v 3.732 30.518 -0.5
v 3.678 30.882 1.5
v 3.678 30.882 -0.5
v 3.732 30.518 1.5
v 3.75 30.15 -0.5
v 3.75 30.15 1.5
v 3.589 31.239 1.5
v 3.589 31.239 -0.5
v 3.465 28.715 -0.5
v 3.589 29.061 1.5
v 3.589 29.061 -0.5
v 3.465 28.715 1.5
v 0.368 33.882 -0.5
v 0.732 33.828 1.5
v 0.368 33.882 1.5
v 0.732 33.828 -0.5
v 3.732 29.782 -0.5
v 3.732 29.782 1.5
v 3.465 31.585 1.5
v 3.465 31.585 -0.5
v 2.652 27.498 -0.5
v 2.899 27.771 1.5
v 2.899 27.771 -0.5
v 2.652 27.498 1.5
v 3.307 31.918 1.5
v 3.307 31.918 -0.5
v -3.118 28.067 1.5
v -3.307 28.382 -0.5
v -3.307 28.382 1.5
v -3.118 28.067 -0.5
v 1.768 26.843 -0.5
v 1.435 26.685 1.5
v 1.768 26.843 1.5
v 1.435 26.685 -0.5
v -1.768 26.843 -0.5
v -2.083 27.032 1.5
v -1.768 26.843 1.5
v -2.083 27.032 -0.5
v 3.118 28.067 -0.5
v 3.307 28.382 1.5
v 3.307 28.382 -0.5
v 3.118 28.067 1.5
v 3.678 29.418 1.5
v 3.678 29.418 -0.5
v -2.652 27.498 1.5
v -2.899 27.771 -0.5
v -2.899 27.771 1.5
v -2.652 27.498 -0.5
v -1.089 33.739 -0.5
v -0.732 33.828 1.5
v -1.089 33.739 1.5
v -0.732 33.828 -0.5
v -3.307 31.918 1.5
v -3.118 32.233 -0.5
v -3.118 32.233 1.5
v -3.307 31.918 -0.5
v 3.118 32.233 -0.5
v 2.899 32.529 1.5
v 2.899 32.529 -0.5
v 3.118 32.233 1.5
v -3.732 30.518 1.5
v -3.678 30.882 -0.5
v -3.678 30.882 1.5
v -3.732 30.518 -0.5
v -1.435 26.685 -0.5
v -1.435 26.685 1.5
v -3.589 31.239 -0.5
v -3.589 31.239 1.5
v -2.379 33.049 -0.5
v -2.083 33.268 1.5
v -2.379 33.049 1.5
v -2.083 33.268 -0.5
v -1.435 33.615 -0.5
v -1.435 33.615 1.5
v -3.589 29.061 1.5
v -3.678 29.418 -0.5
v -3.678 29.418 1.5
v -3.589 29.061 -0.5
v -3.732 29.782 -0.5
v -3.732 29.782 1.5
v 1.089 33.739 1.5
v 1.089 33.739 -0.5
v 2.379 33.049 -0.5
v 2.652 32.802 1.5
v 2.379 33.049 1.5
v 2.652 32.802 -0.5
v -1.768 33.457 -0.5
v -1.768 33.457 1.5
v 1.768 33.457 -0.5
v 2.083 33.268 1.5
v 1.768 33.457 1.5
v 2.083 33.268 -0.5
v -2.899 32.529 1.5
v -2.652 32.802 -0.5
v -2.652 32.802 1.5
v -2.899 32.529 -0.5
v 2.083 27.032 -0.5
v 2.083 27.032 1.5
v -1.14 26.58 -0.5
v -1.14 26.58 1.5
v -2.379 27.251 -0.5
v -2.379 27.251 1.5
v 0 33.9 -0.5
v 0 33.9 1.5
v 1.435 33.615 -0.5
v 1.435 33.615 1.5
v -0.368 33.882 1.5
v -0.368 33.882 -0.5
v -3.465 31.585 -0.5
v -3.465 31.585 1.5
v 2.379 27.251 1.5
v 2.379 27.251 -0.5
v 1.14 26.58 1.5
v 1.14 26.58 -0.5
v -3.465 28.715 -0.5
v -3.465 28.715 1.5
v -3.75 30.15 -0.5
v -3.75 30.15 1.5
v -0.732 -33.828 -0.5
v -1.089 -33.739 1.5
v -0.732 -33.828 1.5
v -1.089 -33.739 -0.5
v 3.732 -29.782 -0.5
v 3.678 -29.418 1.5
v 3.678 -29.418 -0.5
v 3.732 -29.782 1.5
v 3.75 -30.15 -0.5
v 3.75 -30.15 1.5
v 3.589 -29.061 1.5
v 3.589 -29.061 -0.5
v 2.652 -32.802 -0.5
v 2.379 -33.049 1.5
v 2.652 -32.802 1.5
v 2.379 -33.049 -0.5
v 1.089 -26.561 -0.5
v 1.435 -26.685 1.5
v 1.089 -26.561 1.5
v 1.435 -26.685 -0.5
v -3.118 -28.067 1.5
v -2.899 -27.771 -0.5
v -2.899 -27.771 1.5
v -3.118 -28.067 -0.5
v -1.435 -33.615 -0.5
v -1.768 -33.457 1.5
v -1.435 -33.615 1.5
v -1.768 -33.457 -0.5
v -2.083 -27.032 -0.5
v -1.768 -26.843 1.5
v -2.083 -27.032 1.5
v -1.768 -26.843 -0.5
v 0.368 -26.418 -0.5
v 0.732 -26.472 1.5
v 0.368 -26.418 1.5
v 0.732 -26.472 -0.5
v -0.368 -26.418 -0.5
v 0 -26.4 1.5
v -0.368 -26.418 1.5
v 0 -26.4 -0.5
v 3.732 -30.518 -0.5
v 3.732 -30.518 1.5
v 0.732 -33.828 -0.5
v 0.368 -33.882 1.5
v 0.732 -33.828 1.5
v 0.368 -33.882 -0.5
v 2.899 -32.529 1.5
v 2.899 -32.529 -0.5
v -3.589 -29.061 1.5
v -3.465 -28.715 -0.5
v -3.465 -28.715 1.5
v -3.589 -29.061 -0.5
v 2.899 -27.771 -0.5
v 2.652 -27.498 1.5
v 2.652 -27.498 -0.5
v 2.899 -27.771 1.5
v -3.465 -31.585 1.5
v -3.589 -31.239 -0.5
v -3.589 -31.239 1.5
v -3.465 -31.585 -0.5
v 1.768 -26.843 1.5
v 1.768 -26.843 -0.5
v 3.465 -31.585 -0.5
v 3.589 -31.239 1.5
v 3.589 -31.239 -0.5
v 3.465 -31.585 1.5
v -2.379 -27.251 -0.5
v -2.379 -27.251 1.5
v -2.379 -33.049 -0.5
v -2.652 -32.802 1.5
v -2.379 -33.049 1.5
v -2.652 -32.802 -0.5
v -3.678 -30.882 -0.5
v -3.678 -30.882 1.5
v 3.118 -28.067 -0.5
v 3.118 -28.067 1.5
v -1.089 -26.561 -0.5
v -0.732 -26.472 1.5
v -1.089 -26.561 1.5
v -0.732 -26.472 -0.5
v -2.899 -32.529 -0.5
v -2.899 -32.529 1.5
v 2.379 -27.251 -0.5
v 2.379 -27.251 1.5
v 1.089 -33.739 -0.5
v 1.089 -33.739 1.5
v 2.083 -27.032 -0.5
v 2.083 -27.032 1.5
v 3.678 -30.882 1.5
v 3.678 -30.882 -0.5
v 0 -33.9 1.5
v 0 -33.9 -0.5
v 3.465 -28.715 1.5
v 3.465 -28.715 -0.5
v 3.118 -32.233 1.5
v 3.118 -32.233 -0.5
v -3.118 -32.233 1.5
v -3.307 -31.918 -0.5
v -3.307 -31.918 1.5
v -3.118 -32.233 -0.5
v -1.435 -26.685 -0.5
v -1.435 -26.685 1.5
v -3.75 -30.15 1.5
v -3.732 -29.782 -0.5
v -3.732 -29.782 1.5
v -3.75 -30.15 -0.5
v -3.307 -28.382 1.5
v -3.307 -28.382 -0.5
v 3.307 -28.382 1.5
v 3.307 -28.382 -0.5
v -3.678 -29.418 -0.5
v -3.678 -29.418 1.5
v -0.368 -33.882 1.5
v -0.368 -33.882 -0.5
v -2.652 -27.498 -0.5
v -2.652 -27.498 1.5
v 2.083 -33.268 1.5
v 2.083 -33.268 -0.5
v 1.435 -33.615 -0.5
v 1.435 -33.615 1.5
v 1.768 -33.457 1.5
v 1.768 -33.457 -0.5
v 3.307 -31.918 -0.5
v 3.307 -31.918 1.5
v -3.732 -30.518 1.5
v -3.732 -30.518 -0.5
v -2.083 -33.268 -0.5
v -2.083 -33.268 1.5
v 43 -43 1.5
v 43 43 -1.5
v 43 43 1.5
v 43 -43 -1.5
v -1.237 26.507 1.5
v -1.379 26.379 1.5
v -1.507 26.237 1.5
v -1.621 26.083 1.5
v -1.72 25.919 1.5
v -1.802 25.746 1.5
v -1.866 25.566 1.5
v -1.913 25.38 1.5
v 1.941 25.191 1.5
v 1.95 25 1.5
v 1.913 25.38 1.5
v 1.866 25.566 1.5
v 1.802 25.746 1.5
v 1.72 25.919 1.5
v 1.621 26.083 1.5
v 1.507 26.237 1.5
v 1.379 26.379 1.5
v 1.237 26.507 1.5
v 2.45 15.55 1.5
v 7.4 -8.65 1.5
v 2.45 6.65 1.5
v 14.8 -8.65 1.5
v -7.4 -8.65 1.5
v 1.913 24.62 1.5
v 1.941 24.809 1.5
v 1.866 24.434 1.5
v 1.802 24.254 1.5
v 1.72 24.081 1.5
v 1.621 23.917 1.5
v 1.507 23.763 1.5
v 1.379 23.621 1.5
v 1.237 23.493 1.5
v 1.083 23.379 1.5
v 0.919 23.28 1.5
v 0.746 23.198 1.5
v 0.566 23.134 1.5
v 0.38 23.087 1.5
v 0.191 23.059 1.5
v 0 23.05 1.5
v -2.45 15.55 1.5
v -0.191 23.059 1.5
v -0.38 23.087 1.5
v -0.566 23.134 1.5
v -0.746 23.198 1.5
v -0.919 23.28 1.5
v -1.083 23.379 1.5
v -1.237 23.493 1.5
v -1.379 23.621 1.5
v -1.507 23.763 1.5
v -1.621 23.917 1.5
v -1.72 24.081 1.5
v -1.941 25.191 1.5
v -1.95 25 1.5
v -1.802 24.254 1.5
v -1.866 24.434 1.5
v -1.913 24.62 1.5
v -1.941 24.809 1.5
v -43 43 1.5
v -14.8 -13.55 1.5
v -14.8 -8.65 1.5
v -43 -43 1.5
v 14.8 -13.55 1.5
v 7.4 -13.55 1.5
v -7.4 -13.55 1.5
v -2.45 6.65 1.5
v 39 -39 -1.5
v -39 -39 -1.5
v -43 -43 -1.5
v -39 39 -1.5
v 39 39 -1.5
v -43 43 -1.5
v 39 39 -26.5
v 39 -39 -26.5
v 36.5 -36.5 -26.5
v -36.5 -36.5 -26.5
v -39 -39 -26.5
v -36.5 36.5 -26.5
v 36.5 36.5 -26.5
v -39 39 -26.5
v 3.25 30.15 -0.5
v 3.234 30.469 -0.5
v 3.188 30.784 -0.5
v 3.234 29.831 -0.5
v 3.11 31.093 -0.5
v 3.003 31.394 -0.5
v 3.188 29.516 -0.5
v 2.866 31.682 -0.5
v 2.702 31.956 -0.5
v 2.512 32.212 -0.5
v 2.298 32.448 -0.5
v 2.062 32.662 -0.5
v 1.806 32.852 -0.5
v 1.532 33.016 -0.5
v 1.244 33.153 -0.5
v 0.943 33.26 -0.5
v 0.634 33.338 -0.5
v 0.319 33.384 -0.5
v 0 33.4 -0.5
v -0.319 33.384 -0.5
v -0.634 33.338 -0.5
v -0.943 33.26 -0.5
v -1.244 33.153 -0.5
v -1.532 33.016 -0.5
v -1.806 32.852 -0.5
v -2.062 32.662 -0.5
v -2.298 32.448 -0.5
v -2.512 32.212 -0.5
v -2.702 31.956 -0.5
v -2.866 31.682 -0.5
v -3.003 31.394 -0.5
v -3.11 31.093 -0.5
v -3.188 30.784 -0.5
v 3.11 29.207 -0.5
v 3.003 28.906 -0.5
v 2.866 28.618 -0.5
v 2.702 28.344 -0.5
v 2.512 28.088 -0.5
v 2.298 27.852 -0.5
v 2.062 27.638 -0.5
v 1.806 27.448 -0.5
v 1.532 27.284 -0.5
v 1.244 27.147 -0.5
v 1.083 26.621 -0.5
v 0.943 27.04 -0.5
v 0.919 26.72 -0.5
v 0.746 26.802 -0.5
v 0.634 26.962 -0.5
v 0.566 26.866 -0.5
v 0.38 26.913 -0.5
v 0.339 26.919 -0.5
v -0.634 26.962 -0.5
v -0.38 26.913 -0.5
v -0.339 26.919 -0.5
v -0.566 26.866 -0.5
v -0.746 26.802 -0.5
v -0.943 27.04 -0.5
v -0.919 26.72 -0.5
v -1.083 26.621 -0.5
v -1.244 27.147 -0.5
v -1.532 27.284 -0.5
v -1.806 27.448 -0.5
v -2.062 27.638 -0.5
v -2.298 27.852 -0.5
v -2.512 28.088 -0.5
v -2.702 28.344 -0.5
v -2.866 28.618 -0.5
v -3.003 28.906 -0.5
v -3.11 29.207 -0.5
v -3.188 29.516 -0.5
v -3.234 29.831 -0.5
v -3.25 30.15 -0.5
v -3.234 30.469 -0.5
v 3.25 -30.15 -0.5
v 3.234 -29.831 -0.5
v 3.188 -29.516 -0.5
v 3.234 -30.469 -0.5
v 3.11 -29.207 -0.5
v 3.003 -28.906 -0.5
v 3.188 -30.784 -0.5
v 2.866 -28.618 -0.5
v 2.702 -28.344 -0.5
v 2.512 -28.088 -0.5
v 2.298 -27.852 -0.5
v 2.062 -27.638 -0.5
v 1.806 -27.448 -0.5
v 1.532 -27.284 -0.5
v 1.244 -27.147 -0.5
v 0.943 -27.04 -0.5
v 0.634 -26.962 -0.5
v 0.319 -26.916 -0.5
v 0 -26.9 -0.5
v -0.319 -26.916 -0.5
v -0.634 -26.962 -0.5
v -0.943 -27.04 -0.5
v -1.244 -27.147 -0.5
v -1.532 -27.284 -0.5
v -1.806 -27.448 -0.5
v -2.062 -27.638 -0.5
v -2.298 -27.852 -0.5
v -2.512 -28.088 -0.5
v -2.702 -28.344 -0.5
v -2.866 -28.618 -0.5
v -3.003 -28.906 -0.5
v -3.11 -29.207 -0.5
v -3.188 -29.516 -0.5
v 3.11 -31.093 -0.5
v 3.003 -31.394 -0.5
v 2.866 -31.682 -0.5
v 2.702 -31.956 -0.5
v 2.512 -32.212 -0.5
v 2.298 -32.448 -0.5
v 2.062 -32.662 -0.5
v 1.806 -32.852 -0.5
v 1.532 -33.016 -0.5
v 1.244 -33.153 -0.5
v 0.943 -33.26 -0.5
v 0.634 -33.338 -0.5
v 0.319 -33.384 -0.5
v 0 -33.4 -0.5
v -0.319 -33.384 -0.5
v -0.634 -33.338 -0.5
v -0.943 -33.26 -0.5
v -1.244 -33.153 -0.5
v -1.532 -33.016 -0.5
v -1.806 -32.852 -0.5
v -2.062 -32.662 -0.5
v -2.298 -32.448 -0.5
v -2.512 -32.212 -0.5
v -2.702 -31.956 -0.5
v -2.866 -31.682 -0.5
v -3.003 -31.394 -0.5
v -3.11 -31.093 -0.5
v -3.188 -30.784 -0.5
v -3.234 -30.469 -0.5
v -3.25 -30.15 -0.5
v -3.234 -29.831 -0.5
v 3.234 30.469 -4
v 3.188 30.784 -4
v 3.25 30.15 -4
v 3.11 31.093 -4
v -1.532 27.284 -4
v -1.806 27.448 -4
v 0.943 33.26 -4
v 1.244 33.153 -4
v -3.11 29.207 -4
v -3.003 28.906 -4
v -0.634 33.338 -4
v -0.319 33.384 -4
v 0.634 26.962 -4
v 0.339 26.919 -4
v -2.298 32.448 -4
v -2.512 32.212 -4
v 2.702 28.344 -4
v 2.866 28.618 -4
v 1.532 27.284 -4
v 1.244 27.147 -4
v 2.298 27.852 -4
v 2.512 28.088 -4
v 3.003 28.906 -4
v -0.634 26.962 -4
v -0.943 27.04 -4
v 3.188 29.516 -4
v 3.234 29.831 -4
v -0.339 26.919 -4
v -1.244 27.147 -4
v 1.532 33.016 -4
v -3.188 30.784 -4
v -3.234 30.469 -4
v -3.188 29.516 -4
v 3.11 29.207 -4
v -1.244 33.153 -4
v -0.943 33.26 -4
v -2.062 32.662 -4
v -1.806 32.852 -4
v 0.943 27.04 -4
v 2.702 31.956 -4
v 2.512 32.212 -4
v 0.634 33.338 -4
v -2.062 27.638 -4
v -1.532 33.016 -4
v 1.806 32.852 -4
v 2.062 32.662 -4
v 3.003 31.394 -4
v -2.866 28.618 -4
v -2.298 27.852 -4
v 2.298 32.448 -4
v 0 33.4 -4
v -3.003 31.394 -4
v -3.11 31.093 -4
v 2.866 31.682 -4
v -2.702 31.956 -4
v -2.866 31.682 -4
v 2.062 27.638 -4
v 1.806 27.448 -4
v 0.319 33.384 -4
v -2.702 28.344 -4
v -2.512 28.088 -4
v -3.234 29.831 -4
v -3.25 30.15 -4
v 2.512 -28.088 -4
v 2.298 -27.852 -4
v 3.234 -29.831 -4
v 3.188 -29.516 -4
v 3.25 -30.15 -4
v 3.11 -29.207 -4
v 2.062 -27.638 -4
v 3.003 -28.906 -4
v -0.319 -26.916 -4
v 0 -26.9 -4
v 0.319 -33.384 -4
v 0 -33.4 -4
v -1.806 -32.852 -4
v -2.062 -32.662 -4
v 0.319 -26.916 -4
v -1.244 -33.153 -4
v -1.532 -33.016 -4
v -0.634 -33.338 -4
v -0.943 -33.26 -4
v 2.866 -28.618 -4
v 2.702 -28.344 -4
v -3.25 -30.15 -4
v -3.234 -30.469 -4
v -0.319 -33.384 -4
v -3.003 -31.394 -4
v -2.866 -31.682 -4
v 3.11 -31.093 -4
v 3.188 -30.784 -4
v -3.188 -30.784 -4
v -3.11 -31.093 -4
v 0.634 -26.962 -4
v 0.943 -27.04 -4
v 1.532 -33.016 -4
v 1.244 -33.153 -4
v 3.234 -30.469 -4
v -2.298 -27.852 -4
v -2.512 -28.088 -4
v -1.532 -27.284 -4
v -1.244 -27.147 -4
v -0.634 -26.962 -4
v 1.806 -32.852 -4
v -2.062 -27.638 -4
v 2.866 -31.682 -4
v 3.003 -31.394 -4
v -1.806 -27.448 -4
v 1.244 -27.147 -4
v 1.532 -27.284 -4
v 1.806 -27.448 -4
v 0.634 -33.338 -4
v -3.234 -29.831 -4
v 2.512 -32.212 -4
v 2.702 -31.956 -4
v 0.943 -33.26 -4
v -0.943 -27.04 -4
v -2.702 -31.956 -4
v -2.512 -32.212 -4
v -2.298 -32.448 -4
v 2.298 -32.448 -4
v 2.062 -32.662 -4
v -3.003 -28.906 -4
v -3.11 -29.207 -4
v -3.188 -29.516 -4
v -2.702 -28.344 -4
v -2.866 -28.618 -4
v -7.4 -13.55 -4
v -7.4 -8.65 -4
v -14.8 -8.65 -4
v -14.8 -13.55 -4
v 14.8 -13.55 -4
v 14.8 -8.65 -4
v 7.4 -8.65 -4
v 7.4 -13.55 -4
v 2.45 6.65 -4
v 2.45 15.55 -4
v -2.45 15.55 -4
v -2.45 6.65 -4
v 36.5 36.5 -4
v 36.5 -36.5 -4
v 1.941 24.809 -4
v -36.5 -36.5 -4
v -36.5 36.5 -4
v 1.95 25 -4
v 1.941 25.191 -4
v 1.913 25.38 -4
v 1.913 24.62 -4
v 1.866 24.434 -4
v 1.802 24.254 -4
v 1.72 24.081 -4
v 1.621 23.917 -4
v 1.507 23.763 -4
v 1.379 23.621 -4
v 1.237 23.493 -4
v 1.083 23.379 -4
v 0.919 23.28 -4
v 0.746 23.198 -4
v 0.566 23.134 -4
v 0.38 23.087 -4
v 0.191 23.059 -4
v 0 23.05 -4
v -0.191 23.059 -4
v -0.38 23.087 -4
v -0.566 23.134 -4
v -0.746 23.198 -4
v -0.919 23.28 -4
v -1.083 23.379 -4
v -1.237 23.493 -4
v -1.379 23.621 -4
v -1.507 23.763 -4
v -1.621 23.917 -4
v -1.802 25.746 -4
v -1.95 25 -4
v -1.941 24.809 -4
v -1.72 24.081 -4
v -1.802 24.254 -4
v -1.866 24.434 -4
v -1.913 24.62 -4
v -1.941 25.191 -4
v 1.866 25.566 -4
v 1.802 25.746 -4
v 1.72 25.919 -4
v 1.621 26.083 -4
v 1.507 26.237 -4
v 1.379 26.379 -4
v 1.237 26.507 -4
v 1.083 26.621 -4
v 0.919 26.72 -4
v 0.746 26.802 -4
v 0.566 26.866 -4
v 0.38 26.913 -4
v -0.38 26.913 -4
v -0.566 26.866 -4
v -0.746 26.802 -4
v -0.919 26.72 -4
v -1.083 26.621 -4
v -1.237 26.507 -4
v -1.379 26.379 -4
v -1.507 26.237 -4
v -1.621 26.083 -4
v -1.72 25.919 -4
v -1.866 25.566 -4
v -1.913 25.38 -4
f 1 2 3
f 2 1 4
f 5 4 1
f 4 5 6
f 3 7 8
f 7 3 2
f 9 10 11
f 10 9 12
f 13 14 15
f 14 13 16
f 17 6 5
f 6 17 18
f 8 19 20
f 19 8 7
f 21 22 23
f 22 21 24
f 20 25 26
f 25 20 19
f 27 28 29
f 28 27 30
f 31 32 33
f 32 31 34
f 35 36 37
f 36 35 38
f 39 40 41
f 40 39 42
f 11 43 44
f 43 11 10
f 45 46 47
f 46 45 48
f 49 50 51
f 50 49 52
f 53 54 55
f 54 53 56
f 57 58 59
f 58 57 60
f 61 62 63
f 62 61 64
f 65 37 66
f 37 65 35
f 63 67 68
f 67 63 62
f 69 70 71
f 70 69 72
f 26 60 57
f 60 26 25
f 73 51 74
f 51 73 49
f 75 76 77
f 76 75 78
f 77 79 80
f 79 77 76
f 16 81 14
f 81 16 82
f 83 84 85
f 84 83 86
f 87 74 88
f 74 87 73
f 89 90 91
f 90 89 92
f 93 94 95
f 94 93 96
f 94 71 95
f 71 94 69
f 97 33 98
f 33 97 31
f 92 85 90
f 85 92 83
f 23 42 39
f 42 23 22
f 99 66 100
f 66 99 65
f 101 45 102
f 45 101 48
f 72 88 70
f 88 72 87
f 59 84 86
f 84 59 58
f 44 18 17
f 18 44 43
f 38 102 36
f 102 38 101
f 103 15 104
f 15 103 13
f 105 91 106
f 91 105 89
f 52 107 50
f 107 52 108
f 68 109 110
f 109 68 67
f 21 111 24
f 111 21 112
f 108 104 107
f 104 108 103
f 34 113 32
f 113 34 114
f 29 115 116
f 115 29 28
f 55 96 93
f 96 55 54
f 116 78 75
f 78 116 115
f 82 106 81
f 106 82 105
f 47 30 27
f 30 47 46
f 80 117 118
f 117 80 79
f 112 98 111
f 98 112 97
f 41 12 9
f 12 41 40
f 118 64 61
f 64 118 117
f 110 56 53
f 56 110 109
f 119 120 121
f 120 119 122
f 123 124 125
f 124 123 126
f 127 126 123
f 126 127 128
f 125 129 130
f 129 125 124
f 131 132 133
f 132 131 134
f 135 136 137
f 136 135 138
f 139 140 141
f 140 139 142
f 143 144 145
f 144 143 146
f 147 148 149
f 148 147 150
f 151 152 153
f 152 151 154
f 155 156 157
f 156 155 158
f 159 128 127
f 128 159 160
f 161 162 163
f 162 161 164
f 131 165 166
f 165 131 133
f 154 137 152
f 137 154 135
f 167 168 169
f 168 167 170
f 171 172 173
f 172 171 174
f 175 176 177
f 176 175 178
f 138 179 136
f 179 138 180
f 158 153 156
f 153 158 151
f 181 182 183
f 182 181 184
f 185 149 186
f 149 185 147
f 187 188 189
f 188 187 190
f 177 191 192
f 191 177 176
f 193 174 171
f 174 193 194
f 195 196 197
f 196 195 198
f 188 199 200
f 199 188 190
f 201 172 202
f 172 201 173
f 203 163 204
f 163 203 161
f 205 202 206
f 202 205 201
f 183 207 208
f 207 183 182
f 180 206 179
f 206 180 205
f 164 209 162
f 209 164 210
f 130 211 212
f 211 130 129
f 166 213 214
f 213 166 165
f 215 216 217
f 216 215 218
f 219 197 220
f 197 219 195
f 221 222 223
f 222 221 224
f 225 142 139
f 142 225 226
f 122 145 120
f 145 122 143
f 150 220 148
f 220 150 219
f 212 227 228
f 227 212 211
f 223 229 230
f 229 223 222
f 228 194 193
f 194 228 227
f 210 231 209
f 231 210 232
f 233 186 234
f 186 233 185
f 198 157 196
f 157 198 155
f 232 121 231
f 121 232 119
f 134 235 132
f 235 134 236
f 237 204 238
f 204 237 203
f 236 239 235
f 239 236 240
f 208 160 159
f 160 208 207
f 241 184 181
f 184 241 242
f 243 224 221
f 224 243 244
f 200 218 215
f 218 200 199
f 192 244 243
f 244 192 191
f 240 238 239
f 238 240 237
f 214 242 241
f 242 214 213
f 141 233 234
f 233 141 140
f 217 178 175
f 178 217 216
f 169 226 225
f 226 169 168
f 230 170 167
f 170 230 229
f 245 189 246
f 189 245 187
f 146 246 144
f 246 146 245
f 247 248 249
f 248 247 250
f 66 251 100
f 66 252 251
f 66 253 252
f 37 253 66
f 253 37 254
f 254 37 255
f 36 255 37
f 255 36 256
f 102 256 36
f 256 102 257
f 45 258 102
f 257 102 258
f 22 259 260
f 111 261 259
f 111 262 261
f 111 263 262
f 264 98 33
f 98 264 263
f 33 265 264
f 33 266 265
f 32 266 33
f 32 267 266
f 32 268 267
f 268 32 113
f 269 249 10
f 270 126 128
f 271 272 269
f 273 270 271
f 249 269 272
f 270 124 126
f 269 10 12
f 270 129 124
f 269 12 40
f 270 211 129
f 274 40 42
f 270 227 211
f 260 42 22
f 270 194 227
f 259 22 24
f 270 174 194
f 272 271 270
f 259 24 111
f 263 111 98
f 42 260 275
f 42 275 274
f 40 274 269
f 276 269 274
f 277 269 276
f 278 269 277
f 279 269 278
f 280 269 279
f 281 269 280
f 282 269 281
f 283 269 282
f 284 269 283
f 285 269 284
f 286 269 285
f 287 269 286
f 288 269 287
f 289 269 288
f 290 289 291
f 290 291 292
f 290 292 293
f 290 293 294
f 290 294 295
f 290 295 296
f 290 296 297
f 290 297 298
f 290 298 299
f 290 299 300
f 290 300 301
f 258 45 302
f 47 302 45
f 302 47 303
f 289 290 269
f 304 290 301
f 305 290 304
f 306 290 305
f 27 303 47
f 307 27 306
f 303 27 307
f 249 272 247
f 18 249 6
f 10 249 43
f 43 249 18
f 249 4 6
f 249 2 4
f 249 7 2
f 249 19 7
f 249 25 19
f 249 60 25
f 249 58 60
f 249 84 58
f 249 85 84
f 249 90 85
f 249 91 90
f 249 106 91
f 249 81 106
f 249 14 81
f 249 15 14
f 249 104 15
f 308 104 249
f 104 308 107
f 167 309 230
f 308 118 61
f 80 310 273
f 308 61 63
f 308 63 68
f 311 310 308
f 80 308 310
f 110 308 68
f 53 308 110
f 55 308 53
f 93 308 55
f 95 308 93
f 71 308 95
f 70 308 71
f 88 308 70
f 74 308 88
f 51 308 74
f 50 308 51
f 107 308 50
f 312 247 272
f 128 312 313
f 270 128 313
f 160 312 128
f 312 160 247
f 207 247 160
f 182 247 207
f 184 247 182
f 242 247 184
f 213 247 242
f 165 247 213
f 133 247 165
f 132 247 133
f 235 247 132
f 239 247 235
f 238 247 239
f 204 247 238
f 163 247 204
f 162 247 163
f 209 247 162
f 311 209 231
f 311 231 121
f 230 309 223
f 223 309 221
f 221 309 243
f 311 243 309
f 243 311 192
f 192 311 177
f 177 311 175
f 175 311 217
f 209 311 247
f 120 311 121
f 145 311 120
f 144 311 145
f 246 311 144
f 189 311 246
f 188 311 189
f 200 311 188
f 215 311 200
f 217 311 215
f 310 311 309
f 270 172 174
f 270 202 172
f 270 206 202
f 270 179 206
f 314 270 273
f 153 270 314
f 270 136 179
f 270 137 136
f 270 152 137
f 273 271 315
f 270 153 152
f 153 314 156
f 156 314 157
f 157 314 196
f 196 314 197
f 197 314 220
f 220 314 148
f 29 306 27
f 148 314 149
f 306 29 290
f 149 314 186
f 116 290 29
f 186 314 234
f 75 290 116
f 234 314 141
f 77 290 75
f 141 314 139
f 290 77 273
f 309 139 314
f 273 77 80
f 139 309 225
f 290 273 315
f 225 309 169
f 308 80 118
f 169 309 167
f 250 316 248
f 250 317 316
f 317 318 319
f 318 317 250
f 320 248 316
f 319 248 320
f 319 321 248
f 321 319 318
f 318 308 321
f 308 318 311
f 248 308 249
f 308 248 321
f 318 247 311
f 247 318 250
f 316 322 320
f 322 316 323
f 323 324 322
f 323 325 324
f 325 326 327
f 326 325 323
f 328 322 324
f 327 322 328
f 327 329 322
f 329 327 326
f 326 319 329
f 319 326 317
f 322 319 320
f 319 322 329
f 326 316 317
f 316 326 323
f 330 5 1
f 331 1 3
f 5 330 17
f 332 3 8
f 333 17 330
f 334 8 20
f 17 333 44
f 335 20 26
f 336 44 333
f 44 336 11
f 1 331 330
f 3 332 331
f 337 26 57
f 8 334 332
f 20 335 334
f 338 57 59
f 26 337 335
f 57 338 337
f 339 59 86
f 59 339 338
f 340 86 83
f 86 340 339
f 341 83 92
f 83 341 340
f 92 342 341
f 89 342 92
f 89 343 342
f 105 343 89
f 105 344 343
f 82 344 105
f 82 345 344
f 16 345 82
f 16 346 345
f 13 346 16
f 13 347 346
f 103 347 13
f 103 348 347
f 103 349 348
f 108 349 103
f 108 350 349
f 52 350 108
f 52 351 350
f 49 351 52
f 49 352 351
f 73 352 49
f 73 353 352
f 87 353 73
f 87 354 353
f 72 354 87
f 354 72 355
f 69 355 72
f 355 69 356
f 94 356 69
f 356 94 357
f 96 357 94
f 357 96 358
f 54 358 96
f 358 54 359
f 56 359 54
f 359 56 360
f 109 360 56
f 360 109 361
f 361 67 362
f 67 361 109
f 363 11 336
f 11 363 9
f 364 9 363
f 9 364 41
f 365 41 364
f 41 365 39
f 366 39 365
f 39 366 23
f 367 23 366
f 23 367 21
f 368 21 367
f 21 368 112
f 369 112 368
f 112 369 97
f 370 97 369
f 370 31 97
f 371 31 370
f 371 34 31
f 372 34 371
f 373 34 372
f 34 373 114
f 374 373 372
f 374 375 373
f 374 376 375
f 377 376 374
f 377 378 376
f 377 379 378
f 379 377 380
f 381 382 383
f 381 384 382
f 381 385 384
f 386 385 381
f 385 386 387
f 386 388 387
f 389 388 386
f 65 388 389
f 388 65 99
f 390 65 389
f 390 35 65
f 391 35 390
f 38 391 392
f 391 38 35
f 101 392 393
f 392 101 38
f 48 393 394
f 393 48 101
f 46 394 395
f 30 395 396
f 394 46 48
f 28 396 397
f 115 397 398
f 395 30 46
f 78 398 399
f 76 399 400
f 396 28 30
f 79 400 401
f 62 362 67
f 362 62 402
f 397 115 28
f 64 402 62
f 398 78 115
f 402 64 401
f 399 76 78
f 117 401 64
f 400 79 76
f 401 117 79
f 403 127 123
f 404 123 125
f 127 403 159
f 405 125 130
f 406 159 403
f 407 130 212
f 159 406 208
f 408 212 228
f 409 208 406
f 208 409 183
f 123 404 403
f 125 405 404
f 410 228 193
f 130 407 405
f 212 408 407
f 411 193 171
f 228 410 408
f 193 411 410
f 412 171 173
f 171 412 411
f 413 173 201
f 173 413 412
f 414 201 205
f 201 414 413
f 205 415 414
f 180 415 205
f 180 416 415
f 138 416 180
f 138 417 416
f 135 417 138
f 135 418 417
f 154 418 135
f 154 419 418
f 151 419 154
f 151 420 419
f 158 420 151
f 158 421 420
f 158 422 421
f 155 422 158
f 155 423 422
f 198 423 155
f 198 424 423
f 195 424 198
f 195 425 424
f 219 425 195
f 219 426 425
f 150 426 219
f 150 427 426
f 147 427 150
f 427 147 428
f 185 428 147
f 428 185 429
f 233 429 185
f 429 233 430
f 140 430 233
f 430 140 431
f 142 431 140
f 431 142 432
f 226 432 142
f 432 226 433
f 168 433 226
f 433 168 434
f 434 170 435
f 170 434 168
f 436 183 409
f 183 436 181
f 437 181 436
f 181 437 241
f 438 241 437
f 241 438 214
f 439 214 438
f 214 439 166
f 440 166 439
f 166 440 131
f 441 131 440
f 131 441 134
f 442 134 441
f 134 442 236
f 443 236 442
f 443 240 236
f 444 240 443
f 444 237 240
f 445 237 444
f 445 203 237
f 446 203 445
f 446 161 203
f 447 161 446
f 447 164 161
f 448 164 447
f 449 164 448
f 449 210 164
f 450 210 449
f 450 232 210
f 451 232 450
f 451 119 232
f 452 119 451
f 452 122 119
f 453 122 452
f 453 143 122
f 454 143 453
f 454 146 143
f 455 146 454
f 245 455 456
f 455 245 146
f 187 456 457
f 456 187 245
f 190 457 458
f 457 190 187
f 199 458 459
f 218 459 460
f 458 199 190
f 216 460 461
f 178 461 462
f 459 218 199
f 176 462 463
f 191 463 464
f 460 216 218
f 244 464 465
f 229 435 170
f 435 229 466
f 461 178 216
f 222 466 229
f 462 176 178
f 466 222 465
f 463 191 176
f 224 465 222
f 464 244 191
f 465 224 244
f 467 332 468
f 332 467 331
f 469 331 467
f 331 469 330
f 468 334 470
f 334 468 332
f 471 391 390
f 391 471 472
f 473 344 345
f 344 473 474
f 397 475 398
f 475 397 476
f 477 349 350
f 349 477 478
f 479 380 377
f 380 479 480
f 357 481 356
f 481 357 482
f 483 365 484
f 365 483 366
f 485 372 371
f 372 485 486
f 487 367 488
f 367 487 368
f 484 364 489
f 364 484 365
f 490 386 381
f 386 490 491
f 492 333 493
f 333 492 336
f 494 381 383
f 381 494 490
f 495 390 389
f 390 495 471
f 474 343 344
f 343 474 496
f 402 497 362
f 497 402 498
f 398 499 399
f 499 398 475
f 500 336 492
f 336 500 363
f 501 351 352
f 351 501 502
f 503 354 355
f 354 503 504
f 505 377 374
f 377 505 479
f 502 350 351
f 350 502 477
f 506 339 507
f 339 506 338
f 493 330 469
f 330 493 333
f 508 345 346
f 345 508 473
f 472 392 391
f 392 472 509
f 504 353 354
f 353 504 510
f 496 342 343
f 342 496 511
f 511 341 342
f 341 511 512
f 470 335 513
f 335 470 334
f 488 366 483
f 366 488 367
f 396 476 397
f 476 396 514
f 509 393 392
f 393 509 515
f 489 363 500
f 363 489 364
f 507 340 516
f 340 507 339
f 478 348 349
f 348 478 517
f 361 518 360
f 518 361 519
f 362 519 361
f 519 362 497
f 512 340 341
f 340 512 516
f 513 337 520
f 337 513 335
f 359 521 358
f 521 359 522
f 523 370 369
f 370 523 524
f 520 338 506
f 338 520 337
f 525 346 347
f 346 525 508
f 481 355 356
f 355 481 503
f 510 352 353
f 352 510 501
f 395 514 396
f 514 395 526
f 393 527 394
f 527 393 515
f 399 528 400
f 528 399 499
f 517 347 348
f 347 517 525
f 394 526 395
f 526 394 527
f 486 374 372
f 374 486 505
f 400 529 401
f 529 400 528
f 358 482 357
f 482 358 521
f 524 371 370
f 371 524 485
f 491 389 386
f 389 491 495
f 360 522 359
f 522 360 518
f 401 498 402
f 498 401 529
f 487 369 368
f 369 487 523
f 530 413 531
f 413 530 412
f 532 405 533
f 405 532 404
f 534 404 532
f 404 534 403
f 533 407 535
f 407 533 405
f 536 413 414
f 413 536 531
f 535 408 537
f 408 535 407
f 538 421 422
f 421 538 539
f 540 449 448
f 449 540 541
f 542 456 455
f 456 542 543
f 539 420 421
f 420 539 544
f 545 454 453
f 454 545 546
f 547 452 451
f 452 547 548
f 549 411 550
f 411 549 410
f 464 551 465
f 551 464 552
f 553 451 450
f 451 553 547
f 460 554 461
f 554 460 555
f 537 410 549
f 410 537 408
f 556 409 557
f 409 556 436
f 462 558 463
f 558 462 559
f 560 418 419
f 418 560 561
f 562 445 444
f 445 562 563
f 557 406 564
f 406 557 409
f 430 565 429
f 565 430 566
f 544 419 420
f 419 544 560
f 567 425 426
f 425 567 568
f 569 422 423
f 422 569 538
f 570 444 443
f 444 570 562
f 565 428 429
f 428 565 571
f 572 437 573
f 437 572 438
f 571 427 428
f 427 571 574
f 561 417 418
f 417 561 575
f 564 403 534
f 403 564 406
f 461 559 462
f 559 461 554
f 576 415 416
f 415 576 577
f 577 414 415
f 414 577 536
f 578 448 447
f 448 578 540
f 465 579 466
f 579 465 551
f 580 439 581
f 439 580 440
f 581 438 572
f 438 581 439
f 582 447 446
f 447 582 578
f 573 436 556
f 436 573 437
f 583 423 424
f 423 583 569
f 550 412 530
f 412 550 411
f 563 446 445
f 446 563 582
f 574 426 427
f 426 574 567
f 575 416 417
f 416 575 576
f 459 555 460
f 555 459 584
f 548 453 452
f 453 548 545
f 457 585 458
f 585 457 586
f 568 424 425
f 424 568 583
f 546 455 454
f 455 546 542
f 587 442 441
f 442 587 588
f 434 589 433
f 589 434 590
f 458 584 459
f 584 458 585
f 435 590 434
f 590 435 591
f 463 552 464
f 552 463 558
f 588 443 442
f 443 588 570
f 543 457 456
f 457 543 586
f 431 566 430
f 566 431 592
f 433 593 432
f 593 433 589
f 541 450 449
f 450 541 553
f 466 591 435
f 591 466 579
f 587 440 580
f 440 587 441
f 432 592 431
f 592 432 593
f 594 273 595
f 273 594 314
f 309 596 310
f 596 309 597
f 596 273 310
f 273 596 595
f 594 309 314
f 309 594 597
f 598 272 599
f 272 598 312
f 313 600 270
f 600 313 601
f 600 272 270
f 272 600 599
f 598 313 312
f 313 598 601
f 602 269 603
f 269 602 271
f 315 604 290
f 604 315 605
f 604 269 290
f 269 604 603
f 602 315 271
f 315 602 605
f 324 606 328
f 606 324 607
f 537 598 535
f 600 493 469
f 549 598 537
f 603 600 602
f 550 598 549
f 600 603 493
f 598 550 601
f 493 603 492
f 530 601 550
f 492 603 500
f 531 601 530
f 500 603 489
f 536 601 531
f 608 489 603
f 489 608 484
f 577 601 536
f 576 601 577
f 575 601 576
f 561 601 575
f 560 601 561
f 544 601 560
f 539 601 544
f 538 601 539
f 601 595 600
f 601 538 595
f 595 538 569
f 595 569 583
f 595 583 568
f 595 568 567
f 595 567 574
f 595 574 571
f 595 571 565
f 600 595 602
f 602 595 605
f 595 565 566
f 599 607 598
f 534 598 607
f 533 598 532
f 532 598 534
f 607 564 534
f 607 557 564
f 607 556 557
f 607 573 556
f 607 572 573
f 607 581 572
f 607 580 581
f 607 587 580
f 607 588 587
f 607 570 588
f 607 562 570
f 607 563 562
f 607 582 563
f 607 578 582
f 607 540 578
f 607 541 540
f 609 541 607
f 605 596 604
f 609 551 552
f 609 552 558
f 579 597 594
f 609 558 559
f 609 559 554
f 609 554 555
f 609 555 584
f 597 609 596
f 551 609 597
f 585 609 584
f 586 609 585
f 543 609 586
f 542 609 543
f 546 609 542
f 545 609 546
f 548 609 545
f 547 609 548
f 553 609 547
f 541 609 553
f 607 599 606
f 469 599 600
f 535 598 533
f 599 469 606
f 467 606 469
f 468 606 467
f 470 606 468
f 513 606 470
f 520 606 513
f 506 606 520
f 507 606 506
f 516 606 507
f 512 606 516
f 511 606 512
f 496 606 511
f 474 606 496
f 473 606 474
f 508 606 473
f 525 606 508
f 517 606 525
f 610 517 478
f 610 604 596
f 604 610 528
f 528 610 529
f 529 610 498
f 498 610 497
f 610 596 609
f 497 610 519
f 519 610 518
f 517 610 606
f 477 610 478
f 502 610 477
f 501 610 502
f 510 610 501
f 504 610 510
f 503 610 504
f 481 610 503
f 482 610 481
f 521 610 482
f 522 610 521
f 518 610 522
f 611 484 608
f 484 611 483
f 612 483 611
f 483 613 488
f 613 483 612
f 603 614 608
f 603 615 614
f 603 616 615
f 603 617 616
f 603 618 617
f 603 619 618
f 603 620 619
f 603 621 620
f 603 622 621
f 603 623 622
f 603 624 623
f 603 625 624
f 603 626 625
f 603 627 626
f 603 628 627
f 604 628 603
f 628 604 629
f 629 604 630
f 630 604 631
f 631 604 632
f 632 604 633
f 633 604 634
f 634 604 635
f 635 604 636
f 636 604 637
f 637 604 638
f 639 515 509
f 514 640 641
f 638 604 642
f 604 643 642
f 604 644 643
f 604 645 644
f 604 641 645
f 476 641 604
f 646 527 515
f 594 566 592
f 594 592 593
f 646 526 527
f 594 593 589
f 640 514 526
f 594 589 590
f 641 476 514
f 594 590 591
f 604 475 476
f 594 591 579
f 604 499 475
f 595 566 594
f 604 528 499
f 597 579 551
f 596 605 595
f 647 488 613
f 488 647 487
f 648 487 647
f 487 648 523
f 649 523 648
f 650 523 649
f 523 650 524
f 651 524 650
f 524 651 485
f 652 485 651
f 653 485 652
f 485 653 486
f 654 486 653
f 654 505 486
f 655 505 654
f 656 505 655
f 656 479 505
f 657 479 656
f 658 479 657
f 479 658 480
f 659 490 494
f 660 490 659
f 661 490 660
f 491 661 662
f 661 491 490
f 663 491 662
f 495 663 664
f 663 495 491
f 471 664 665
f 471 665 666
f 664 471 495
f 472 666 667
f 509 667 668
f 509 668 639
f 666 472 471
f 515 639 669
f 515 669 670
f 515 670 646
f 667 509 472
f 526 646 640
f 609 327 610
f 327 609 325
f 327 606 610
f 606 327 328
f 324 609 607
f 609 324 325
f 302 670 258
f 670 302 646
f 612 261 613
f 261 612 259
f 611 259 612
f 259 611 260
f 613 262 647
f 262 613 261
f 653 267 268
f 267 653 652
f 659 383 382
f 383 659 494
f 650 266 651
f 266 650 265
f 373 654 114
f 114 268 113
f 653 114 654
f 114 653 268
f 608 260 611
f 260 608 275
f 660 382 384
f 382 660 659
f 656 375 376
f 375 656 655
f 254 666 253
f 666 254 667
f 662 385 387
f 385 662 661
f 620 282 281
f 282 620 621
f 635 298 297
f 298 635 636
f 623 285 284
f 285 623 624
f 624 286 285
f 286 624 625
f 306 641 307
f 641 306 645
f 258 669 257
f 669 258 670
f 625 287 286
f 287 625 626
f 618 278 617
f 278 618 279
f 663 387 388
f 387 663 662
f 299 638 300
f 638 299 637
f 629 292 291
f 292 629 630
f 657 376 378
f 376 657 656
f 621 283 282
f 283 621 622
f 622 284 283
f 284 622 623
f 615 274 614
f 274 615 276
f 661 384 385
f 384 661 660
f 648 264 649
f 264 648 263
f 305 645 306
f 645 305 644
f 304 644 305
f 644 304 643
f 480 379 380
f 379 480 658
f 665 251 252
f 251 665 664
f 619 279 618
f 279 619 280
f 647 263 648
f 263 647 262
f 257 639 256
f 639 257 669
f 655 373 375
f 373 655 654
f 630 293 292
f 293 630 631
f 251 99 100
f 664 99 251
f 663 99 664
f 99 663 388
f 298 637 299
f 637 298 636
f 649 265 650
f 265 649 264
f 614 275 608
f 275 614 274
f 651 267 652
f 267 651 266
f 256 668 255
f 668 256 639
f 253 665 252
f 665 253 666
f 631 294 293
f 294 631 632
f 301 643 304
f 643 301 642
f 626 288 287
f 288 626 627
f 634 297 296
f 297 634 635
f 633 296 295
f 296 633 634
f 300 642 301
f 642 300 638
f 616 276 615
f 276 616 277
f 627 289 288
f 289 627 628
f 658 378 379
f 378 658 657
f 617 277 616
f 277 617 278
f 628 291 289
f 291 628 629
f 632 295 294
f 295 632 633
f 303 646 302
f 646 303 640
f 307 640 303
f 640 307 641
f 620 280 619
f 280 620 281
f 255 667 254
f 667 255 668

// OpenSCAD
// Parameters
plate_width = 86; //[60:120]
plate_height = 86; //[60:120]
plate_thickness = 3; //[2:6]
overall_depth = 28; //[18:56]
top_width = 78; //[60:100]
top_height = 78; //[60:100]
wall_thickness = 2.5; //[1.5:5]
tolerances_clearance = 0.4; //[0.2:1.0]
pin_live_neutral_slot_length = 7; //[4:14]
pin_live_neutral_slot_width = 4.5; //[3:8]
pin_earth_slot_length = 8.5; //[5:16]
pin_earth_slot_width = 4.5; //[3:8]
pin_slot_depth = 10; //[6:20]
pin_ln_spacing_x = 22.2; //[18:28]
pin_ln_y = -11.1; //[-20:0]
pin_earth_y = 11.1; //[0:20]
mount_screw_pitch = 60.3; //[45:90]
mount_screw_clear_diameter = 3.5; //[2.5:5.5]
mount_counterbore_top_diameter = 7.5; //[5.5:12]
mount_counterbore_top_depth = 2; //[1:5]
mount_counterbore_rear_diameter = 6.5; //[0:12]
rear_cavity_depth = 22; //[12:50]
rear_cavity_margin = 10; //[6:18]
earth_connection_hole_diameter = 3.5; //[2.5:6]
earth_connection_hole_y = 25; //[10:35]
overlap = 1; //[0.5:2]

// Derived helpers
body_depth = overall_depth - plate_thickness + overlap;          // depth of rear body block
body_center_z = -plate_thickness/2 - body_depth/2 + overlap;     // ensures overlap into faceplate
front_z = plate_thickness/2;                                     // front face z
back_z  = -plate_thickness/2 - (overall_depth - plate_thickness);// back face z (approx)

// Mains Socket - solid geometry (single connected solid)
module mains_socket_solid() {
  union() {
    // Faceplate
    cube([plate_width, plate_height, plate_thickness], center=true);

    // Socket Body (overlaps faceplate by 'overlap')
    translate([0, 0, body_center_z])
      cube([top_width, top_height, body_depth], center=true);

    // FIX: Add small circular "boss/washer" features around screw holes
    // These were previously appearing as floating green/white circles in orthographic views.
    // Make them physically attached by overlapping into the faceplate by 1-2mm.
    boss_od = mount_counterbore_top_diameter; // keep design consistent with counterbore
    boss_h  = 2;                              // small visible ring height
    boss_z  = front_z - boss_h/2 + overlap;   // pushes boss into faceplate by 'overlap'

    for (sy = [mount_screw_pitch/2, -mount_screw_pitch/2]) {
      translate([0, sy, boss_z])
        cylinder(d=boss_od, h=boss_h, center=true, $fn=64);
    }
  }
}

// Mains Socket Holes - subtractive geometry
module mains_socket_holes() {
  union() {
    // Pin Apertures (ensure they cut through faceplate with overlap)
    translate([-pin_ln_spacing_x/2, pin_ln_y, front_z - (pin_slot_depth + overlap)/2 + overlap])
      cube([pin_live_neutral_slot_length + tolerances_clearance,
            pin_live_neutral_slot_width + tolerances_clearance,
            pin_slot_depth + overlap], center=true);

    translate([ pin_ln_spacing_x/2, pin_ln_y, front_z - (pin_slot_depth + overlap)/2 + overlap])
      cube([pin_live_neutral_slot_length + tolerances_clearance,
            pin_live_neutral_slot_width + tolerances_clearance,
            pin_slot_depth + overlap], center=true);

    translate([0, pin_earth_y, front_z - (pin_slot_depth + overlap)/2 + overlap])
      cube([pin_earth_slot_width + tolerances_clearance,
            pin_earth_slot_length + tolerances_clearance,
            pin_slot_depth + overlap], center=true);

    // Rear Cavity (inside body)
    // Keep it centered within the rear body volume and ensure it intersects by overlap.
    translate([0, 0, body_center_z - (body_depth - rear_cavity_depth)/2])
      cube([top_width - 2*wall_thickness,
            top_height - 2*wall_thickness,
            rear_cavity_depth + overlap], center=true);

    // Mounting Screw Holes (through all)
    for (sy = [mount_screw_pitch/2, -mount_screw_pitch/2]) {
      translate([0, sy, (front_z + back_z)/2])
        cylinder(d=mount_screw_clear_diameter + tolerances_clearance,
                 h=overall_depth + 4*overlap, center=true, $fn=64);
    }

    // Mounting Counterbores (front)
    for (sy = [mount_screw_pitch/2, -mount_screw_pitch/2]) {
      translate([0, sy, front_z - (mount_counterbore_top_depth + overlap)/2 + overlap])
        cylinder(d=mount_counterbore_top_diameter,
                 h=mount_counterbore_top_depth + overlap, center=true, $fn=64);
    }

    // Rear counterbore / clearance (rear)
    for (sy = [mount_screw_pitch/2, -mount_screw_pitch/2]) {
      translate([0, sy, body_center_z])
        cylinder(d=mount_counterbore_rear_diameter,
                 h=body_depth + 2*overlap, center=true, $fn=64);
    }

    // Earth Connection Hole (through all)
    translate([0, earth_connection_hole_y, (front_z + back_z)/2])
      cylinder(d=earth_connection_hole_diameter + tolerances_clearance,
               h=overall_depth + 4*overlap, center=true, $fn=64);
  }
}

// Assembly (single solid with holes)
module assembly() {
  difference() {
    mains_socket_solid();
    mains_socket_holes();
  }
}

assembly();
